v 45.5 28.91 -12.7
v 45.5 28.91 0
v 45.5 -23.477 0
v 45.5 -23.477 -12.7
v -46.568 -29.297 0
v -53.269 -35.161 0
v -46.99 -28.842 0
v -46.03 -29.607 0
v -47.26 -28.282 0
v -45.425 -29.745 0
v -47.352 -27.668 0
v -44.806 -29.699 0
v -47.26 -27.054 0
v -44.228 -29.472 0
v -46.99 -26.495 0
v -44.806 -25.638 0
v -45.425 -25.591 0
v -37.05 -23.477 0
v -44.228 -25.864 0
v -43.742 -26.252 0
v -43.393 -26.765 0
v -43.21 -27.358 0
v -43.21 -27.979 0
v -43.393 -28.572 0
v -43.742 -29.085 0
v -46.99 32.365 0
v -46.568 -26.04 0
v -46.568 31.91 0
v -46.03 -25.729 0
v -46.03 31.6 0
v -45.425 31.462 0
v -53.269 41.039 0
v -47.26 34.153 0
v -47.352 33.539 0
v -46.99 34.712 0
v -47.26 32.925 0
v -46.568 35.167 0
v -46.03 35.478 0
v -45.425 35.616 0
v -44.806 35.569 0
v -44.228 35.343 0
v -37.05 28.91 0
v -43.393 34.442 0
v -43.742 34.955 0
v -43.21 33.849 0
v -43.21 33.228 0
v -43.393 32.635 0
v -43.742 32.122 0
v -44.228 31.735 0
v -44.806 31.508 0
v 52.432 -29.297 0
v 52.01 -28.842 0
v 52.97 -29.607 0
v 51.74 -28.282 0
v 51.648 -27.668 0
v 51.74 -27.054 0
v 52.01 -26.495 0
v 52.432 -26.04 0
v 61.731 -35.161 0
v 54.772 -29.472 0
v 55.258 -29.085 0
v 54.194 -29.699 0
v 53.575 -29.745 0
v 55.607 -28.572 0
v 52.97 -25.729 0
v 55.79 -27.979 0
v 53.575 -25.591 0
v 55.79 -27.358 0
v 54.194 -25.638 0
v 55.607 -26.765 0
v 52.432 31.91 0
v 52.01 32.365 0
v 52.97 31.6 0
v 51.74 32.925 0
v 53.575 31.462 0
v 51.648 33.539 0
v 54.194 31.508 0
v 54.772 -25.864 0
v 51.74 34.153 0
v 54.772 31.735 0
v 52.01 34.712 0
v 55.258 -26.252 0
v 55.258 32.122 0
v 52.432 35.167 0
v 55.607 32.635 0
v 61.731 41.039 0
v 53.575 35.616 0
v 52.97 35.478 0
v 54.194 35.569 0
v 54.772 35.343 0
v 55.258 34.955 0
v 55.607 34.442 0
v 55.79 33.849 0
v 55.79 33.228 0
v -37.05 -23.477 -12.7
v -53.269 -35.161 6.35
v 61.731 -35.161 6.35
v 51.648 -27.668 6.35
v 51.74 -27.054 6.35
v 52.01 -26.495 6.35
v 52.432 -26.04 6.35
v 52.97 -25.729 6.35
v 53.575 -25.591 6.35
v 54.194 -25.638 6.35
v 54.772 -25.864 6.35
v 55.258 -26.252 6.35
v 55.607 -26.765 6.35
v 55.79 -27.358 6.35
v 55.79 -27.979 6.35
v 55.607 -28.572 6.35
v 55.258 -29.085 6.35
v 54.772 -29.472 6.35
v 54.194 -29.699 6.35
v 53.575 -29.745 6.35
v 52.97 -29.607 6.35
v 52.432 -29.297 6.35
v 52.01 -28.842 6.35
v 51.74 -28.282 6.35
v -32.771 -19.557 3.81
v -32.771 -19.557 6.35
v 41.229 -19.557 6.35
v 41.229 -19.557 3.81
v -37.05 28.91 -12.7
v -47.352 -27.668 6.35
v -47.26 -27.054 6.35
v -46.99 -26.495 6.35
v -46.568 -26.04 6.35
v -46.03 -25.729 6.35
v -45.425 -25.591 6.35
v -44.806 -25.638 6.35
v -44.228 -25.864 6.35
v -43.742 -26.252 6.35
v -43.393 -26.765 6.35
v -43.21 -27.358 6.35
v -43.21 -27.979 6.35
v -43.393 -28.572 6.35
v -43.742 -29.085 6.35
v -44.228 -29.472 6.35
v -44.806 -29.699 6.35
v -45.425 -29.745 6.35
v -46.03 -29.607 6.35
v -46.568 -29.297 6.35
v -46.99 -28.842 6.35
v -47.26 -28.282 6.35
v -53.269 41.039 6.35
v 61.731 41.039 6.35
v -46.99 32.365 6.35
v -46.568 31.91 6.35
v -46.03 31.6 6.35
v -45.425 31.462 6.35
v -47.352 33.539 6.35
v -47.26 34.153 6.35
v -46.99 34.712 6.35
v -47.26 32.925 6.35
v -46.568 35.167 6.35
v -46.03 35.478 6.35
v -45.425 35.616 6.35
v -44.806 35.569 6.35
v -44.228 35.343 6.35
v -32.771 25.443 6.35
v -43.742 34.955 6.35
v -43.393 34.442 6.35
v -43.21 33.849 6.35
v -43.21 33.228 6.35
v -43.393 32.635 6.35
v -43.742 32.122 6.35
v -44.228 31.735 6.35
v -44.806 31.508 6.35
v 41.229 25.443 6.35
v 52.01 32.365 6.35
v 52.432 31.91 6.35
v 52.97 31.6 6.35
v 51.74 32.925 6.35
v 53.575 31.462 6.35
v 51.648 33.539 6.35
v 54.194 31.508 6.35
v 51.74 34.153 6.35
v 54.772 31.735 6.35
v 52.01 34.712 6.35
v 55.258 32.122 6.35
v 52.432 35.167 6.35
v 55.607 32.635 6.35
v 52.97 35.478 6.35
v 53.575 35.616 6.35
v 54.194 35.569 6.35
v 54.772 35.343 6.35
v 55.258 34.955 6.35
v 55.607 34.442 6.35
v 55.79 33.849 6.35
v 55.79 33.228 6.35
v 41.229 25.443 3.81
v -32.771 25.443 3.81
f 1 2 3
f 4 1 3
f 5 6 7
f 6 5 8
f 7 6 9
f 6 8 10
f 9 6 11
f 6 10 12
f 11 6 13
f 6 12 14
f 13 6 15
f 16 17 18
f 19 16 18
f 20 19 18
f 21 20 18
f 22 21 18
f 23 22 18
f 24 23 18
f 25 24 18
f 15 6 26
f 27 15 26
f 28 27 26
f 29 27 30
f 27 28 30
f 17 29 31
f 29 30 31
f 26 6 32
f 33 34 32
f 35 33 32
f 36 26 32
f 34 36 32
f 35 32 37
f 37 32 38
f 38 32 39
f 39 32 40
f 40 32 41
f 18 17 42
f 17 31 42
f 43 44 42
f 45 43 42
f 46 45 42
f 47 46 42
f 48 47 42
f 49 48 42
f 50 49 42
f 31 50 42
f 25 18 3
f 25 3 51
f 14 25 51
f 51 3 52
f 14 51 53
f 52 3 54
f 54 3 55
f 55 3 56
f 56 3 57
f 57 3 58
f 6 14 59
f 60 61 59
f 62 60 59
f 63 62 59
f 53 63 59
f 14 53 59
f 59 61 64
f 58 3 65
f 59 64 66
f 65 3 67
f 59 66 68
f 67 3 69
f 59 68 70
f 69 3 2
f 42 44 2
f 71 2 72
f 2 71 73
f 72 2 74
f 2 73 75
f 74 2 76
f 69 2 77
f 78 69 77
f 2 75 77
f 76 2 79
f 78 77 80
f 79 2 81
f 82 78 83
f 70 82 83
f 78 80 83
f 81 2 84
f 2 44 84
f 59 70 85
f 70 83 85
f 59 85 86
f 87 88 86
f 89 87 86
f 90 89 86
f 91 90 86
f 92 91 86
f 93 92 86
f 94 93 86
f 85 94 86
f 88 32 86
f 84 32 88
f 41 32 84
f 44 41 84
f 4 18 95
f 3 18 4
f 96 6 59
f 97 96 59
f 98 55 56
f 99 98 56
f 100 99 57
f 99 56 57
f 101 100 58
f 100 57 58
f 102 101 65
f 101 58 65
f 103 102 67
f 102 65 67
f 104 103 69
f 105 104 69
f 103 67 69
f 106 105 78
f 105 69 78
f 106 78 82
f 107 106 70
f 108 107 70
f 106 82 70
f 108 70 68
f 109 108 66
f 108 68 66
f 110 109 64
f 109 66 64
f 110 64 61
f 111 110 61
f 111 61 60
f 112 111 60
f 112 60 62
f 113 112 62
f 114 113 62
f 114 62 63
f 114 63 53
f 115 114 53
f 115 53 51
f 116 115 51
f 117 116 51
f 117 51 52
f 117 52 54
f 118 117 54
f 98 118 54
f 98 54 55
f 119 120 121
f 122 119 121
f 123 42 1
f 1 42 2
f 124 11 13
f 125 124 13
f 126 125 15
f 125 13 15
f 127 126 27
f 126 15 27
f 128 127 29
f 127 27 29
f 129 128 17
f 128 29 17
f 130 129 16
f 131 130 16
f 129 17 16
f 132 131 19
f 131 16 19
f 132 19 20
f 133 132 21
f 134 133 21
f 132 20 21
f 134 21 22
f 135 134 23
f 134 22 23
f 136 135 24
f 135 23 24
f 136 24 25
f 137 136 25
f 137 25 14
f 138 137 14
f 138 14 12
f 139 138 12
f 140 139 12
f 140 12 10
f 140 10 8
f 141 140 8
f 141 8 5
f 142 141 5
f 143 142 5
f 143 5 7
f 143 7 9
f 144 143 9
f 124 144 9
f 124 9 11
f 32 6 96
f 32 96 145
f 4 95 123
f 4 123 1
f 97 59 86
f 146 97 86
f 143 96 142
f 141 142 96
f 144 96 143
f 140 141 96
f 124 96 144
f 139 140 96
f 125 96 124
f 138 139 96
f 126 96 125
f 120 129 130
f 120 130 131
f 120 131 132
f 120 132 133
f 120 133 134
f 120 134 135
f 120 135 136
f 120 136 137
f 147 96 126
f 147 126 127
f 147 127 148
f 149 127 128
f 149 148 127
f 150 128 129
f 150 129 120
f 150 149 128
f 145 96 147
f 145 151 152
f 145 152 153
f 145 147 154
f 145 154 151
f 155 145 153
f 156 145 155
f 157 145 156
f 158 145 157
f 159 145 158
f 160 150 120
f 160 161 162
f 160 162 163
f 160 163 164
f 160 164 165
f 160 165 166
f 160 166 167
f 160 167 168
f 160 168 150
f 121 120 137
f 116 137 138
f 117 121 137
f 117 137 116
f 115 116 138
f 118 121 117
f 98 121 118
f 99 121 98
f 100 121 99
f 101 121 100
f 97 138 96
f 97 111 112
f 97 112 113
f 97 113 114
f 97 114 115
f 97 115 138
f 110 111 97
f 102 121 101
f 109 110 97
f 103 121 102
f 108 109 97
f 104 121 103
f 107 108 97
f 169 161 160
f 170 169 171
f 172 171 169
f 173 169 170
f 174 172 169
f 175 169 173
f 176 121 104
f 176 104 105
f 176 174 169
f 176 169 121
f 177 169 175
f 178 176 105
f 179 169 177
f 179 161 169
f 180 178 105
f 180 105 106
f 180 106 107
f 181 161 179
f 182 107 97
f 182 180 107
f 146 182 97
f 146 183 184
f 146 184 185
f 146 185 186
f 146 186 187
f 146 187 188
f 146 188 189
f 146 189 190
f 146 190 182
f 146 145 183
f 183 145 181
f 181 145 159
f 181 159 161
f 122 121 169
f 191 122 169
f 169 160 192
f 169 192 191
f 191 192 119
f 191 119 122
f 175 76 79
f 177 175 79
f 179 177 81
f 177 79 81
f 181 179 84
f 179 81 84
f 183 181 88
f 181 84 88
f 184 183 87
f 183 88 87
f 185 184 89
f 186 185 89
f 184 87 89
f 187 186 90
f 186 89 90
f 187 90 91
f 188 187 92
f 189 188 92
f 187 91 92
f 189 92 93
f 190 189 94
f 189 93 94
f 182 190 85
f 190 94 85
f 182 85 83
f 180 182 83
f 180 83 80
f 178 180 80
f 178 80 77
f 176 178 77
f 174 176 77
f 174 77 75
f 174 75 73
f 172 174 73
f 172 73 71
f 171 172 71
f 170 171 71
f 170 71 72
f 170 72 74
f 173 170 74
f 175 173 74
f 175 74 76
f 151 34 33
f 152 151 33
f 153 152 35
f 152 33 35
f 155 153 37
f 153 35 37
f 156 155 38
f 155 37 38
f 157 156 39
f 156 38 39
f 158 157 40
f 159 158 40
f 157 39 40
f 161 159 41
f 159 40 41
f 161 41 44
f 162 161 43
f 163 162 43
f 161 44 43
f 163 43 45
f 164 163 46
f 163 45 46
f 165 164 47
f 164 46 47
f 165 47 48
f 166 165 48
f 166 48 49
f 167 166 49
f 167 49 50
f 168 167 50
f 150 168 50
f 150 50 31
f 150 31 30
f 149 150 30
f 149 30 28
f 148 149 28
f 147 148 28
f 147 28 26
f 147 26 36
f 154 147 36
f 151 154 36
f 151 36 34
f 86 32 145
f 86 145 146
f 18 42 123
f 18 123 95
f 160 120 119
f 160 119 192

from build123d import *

# Parameters (mm, degrees)
F0_W     = 115
F0_H     = 76.2
F1_DEPTH = 6.35
F2_W     = 82.55
F2_H     = 52.3875
F3_DEPTH = 12.7
F4_W     = 74
F4_H     = 45
F5_DEPTH = 2.54
F7_D     = 4.1656


with BuildPart() as f1:
    # F0 (on Top) → F1 (new body)
    with BuildSketch(Plane.XY):
        with Locations((4.230735, 2.938756)):
            Rectangle(F0_W, F0_H)
    extrude(amount=F1_DEPTH)

    # F2 (on face) → F3 (join)
    with BuildSketch(Plane(origin=(0, 0, 0), x_dir=(1, 0, 0), z_dir=(0, 0, -1))):
        with Locations((4.225135, -2.716506)):
            Rectangle(F2_W, F2_H)
    extrude(amount=F3_DEPTH)

    # F4 (on face) → F5 (cut)
    with BuildSketch(Plane.XY.offset(6.35)):
        with Locations((4.228535, 2.943156)):
            Rectangle(F4_W, F4_H)
    extrude(amount=-F5_DEPTH, mode=Mode.SUBTRACT)

    # F7 (through all)
    with Locations(Plane.XY.offset(6.35)):
        with Locations((-45.269265, 33.538756), (53.730735, 33.538756), (53.730735, -27.668244), (-45.269265, -27.668244)):
            Hole(F7_D / 2)


solid = f1.part
